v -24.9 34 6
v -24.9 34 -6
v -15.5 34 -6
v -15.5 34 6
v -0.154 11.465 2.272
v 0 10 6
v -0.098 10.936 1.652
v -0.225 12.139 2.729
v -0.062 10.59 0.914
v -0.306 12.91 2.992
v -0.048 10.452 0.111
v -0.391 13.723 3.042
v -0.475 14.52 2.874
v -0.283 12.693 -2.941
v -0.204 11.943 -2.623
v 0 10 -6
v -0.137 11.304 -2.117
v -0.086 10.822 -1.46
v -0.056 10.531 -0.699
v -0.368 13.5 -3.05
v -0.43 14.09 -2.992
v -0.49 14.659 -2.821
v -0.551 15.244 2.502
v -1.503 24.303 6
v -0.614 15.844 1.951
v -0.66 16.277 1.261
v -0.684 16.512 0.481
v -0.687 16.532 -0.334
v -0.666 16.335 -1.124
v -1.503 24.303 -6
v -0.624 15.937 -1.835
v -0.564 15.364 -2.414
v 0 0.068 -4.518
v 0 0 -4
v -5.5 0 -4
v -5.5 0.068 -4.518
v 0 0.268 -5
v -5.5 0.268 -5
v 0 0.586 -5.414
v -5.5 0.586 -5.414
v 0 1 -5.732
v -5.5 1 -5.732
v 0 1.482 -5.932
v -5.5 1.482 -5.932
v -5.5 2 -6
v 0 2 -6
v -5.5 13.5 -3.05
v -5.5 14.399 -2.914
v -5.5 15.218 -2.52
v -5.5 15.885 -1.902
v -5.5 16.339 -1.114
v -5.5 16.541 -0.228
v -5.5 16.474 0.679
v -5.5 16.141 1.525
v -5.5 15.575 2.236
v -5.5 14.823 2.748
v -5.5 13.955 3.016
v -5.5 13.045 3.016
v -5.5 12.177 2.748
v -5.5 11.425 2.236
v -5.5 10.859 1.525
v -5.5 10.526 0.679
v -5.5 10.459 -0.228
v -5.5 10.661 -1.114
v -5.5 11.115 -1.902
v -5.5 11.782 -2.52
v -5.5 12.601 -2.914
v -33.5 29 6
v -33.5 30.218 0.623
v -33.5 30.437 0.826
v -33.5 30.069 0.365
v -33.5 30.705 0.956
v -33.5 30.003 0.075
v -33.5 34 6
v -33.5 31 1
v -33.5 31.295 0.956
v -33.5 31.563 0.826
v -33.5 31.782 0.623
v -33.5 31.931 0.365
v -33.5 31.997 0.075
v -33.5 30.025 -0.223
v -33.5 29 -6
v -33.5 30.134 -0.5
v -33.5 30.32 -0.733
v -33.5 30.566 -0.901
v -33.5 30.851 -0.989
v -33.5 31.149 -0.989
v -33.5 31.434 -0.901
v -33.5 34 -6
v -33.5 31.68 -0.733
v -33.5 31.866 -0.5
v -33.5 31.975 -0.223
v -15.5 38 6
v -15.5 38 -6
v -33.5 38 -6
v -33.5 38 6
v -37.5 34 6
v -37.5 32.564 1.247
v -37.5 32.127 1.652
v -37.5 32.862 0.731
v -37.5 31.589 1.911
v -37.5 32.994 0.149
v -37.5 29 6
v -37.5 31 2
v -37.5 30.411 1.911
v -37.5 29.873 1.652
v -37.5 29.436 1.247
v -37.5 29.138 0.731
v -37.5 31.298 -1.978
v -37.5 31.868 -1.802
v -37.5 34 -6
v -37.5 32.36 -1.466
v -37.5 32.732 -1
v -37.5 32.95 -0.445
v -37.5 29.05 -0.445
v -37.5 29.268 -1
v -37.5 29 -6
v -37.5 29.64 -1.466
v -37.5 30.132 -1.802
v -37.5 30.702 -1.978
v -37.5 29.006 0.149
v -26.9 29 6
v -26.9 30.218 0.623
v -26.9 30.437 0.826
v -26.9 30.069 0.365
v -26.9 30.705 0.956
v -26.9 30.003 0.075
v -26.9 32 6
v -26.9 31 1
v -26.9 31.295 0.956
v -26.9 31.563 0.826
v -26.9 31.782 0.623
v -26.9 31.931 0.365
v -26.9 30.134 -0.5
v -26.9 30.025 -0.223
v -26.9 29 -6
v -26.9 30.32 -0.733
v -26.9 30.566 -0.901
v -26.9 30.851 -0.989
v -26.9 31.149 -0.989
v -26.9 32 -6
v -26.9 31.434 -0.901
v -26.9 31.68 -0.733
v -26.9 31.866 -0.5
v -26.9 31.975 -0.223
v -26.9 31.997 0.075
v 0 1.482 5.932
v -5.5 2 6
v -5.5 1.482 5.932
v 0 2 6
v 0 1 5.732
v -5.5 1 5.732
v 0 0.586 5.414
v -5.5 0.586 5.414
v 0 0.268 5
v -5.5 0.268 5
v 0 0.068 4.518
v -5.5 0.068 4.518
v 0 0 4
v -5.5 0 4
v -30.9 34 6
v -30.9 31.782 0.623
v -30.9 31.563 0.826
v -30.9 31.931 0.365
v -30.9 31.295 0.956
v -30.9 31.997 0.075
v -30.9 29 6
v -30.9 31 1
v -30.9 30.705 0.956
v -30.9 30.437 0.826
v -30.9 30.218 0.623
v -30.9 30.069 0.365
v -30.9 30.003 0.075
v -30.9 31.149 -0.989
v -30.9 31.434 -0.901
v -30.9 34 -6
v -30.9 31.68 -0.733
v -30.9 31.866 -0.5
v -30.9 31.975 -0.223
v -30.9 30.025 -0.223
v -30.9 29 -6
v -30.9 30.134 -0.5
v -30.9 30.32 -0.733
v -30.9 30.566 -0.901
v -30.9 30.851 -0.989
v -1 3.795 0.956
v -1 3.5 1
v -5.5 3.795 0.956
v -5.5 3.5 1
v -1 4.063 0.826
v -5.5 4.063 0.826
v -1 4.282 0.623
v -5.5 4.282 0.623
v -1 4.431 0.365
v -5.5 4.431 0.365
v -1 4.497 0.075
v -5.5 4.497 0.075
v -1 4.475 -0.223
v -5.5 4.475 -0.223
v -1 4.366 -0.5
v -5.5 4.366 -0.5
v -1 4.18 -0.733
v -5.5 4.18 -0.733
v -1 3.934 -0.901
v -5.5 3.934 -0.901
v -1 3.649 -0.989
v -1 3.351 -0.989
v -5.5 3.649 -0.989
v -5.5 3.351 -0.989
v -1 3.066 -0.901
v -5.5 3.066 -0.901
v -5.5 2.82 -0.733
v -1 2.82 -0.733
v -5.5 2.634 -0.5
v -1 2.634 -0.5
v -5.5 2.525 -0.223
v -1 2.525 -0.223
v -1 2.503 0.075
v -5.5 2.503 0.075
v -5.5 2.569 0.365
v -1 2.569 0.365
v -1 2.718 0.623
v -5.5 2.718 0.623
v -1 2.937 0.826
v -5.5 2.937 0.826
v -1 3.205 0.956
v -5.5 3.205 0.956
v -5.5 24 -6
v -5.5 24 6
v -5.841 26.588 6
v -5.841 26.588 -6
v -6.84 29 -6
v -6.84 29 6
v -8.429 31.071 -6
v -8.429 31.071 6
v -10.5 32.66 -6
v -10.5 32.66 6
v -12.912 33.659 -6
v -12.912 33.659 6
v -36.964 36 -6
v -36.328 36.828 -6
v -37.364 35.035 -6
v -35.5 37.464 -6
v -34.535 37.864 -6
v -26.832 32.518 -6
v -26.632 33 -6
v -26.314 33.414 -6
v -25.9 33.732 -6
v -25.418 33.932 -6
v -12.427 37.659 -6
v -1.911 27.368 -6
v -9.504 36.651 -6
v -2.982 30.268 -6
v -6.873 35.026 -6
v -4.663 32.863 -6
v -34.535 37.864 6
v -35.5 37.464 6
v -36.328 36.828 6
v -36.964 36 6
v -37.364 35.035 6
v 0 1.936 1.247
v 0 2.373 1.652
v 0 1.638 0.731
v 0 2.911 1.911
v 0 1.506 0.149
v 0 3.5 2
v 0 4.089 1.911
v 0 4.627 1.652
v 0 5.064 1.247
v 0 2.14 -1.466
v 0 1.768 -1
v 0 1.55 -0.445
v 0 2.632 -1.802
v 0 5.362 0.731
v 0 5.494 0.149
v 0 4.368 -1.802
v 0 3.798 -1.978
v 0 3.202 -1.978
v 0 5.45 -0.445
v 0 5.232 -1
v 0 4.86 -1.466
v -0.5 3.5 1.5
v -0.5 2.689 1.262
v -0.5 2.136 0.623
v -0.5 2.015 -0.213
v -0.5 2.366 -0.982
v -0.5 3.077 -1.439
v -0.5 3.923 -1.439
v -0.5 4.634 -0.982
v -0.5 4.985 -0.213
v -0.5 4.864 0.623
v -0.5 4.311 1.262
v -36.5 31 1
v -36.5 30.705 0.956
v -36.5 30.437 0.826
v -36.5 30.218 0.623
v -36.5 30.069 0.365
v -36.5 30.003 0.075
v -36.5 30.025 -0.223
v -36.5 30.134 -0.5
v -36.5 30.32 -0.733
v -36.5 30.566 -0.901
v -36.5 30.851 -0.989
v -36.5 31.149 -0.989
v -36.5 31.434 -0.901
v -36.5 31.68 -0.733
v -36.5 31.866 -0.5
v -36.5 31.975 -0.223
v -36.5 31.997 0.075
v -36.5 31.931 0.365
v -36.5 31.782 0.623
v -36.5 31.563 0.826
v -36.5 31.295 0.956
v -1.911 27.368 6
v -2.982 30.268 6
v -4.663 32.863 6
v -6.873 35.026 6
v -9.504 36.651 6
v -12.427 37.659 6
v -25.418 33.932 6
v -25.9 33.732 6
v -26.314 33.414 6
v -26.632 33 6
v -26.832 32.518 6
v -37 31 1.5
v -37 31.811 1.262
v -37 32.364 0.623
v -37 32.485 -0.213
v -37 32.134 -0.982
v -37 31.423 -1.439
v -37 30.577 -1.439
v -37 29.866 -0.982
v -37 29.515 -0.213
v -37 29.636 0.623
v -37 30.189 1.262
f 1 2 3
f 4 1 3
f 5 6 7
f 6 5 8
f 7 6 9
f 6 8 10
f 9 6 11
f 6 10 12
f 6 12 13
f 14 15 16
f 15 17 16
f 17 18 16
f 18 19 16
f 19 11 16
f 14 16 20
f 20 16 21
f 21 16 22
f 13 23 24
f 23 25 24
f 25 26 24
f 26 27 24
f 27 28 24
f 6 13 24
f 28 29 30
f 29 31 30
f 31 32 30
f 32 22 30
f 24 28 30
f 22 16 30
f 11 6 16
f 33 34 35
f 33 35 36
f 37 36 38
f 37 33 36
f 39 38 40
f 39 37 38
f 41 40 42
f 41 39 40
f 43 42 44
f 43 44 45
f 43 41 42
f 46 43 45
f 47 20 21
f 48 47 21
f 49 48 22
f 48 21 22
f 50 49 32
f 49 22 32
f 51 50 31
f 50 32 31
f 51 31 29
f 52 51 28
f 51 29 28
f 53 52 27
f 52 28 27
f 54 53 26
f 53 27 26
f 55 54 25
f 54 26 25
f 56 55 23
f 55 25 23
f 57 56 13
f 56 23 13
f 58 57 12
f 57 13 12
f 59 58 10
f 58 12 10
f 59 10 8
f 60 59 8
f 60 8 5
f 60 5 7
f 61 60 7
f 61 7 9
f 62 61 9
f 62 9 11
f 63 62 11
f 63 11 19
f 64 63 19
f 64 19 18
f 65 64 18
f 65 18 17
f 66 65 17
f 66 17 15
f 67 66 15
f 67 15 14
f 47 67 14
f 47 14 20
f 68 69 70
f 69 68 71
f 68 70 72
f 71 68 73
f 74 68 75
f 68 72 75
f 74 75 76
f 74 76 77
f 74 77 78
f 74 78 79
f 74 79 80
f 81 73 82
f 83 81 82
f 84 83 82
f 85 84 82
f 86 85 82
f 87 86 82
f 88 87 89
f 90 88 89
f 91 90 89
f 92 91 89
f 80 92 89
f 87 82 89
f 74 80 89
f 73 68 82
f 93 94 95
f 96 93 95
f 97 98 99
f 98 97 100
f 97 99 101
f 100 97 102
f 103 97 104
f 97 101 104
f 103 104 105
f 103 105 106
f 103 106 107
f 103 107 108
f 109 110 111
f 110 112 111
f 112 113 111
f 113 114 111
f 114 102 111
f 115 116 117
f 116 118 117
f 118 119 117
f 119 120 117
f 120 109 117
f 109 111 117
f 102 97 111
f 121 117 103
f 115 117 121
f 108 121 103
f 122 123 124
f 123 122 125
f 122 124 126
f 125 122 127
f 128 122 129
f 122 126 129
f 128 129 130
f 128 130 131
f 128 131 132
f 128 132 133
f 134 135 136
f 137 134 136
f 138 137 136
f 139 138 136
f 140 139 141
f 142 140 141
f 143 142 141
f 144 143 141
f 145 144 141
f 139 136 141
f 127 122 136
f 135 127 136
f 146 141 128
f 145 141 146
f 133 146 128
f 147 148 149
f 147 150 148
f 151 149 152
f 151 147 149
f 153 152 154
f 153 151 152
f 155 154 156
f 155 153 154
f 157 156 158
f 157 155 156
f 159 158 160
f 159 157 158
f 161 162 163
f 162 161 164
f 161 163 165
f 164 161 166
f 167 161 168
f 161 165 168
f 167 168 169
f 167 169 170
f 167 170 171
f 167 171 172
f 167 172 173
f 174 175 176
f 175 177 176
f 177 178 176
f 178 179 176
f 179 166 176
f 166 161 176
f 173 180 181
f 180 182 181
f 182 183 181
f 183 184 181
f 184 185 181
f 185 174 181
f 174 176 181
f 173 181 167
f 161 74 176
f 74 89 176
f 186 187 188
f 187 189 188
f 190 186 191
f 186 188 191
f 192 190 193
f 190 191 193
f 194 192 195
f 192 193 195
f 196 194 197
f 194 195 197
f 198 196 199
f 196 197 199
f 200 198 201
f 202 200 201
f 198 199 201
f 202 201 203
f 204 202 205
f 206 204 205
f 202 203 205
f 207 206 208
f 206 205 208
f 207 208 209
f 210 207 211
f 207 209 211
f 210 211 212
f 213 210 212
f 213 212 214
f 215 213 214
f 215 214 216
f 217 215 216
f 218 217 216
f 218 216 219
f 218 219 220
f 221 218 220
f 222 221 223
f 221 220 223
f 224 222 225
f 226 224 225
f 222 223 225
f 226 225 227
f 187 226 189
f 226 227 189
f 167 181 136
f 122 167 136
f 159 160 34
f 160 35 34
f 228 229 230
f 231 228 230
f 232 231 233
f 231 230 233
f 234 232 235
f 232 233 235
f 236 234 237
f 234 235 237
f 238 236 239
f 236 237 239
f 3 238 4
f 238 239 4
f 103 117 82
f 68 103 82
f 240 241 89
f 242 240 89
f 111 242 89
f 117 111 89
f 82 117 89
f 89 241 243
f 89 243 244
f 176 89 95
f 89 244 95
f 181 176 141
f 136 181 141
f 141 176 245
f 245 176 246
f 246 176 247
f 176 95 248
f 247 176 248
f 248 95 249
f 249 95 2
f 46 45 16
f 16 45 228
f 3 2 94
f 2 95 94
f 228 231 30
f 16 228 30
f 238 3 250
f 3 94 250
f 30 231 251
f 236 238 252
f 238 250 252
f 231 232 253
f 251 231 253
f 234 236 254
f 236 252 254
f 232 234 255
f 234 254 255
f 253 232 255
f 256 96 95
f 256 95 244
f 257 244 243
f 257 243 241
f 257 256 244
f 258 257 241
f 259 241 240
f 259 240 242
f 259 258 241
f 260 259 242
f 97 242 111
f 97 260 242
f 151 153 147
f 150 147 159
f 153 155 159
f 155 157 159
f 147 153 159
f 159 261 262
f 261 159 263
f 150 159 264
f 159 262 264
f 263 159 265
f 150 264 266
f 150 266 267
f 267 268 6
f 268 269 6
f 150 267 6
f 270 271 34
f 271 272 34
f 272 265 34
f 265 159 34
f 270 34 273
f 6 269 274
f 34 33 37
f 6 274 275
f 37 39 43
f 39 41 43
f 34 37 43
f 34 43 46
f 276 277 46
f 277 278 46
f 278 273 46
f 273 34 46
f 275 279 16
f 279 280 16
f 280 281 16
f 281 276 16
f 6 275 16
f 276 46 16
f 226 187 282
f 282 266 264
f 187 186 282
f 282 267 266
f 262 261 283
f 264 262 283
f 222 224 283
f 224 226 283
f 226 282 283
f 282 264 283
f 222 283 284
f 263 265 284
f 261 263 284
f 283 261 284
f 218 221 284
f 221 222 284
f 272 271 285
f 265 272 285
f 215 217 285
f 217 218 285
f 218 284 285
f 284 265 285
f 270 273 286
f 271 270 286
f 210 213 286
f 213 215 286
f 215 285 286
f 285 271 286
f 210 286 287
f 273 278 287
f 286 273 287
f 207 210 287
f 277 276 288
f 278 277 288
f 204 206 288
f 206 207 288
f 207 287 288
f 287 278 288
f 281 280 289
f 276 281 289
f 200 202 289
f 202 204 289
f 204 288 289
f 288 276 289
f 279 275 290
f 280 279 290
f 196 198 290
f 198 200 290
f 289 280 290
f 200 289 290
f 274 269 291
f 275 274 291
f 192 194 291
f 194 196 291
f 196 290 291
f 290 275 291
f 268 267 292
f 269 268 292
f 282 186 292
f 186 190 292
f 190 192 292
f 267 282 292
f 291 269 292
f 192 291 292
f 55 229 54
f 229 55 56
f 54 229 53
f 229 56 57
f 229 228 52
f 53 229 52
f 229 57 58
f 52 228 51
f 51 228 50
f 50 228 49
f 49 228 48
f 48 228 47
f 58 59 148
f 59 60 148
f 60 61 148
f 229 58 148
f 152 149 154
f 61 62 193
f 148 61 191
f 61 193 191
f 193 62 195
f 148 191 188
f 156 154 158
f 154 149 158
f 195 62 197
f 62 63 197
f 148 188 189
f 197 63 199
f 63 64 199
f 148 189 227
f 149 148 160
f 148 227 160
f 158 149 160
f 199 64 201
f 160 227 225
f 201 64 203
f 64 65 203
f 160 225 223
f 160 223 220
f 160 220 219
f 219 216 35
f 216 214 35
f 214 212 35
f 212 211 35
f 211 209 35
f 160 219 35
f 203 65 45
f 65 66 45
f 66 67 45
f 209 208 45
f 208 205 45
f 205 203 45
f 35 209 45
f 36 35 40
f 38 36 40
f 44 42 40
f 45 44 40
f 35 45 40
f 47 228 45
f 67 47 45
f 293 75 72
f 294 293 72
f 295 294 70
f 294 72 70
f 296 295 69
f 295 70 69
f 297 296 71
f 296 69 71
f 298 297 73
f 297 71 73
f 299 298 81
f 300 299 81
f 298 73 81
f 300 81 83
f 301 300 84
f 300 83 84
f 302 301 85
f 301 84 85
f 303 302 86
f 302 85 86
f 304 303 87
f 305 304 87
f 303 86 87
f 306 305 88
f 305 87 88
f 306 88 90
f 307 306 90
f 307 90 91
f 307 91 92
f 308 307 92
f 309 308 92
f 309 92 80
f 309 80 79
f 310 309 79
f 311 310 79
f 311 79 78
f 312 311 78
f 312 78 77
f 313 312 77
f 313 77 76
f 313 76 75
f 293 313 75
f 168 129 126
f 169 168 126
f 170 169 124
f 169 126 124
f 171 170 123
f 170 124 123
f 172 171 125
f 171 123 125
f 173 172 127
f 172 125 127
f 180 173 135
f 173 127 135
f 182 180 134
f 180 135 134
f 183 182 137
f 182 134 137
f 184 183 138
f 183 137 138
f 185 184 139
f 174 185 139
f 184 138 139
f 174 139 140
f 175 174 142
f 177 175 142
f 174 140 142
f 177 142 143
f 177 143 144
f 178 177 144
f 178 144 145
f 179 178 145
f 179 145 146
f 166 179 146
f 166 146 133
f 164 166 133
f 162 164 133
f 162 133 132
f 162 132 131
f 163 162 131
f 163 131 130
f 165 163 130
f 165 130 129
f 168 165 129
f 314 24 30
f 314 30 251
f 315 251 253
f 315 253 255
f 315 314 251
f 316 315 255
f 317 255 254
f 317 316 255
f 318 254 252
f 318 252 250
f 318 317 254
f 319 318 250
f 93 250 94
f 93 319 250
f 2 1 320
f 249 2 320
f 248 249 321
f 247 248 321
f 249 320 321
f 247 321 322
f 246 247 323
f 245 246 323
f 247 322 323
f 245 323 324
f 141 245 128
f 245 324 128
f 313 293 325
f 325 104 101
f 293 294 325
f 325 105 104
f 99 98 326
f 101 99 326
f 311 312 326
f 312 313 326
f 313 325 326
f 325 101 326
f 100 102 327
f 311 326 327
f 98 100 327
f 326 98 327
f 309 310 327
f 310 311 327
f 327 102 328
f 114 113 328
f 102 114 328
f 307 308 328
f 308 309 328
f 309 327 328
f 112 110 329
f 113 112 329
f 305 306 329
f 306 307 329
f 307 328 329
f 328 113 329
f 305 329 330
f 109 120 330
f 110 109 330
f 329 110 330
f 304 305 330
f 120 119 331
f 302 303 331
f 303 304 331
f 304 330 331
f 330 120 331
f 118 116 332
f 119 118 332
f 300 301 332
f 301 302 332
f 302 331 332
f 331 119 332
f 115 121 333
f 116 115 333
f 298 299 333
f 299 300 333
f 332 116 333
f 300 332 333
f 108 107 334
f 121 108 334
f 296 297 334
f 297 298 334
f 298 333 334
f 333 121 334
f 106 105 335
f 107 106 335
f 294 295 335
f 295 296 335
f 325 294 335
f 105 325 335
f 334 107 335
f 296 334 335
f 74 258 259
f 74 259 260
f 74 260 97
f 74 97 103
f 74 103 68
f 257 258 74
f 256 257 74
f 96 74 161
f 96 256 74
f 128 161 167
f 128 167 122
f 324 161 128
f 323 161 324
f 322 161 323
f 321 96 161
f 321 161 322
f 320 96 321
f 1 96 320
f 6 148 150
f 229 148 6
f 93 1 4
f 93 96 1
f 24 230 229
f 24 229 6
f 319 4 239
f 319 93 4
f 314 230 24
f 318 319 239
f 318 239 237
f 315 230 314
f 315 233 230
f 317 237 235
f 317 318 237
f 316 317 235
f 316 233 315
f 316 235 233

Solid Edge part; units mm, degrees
sketch "Sketch1" plane through (0, 0, 0) normal (0, 0, 1) x (1, 0, 0)
  line L0 (-1.5, 38) -> (-37.5, 38)
  line L1 (-37.5, 38) -> (-37.5, 29)
  line L2 (-37.5, 29) -> (-33.5, 29)
  line L3 (-33.5, 29) -> (-33.5, 34)
  line L4 (-33.5, 34) -> (-30.9, 34)
  line L5 (-30.9, 34) -> (-30.9, 29)
  line L6 (-30.9, 29) -> (-26.9, 29)
  line L7 (-26.9, 29) -> (-26.9, 34)
  line L8 (-26.9, 34) -> (-5.5, 34)
  line L9 (-5.5, 34) -> (-5.5, 0)
  line L10 (-5.5, 0) -> (0, 0)
  line L11 (0, 0) -> (0, 10)
  line L12 (0, 10) -> (-1.5, 24.2715)
  line L13 (-1.5, 24.2715) -> (-1.5, 38)
  dimension "D1" = 4
  dimension "D2" = 32
  dimension "D3" = 34
  dimension "D4" = 5
  dimension "D5" = 2.6
  dimension "D6" = 4
  dimension "D7" = 5.5
  dimension "D8" = 4
  dimension "D9" = 10
extrude "Protrusion1" add sketch "Sketch1" along normal mid plane 12
hole "Agujero_1" at (-37.5, 31, 0) direction (1, 0, 0) diameter 2 depth 19.6879
hole "Agujero_3" at (-5.5, 3.5, 0) direction (1, 0, 0) diameter 2 end up to next
chamfer "Chaflán_1" distance 1 angle 45 2 edges at (-37.5, 31, -1) (0, 4.5, 0)
fillet "Redondeo_4" radius 10 1 edges at (-5.5, 34, 0)
fillet "Redondeo_5" radius 2 1 edges at (-26.9, 34, 0)
fillet "Redondeo_2" radius 4 1 edges at (-37.5, 38, 0)
fillet "Redondeo_3" radius 2 2 edges at (-2.75, 0, 6) (-2.75, 0, -6)
fillet "Redondeo_6" radius 14 1 edges at (-1.5, 38, 0)
hole "Agujero_4" at (0, 13.5, 0) direction (-1, 0, 0) diameter 6.1 end up to next
properties material "ABS, medio impacto"
